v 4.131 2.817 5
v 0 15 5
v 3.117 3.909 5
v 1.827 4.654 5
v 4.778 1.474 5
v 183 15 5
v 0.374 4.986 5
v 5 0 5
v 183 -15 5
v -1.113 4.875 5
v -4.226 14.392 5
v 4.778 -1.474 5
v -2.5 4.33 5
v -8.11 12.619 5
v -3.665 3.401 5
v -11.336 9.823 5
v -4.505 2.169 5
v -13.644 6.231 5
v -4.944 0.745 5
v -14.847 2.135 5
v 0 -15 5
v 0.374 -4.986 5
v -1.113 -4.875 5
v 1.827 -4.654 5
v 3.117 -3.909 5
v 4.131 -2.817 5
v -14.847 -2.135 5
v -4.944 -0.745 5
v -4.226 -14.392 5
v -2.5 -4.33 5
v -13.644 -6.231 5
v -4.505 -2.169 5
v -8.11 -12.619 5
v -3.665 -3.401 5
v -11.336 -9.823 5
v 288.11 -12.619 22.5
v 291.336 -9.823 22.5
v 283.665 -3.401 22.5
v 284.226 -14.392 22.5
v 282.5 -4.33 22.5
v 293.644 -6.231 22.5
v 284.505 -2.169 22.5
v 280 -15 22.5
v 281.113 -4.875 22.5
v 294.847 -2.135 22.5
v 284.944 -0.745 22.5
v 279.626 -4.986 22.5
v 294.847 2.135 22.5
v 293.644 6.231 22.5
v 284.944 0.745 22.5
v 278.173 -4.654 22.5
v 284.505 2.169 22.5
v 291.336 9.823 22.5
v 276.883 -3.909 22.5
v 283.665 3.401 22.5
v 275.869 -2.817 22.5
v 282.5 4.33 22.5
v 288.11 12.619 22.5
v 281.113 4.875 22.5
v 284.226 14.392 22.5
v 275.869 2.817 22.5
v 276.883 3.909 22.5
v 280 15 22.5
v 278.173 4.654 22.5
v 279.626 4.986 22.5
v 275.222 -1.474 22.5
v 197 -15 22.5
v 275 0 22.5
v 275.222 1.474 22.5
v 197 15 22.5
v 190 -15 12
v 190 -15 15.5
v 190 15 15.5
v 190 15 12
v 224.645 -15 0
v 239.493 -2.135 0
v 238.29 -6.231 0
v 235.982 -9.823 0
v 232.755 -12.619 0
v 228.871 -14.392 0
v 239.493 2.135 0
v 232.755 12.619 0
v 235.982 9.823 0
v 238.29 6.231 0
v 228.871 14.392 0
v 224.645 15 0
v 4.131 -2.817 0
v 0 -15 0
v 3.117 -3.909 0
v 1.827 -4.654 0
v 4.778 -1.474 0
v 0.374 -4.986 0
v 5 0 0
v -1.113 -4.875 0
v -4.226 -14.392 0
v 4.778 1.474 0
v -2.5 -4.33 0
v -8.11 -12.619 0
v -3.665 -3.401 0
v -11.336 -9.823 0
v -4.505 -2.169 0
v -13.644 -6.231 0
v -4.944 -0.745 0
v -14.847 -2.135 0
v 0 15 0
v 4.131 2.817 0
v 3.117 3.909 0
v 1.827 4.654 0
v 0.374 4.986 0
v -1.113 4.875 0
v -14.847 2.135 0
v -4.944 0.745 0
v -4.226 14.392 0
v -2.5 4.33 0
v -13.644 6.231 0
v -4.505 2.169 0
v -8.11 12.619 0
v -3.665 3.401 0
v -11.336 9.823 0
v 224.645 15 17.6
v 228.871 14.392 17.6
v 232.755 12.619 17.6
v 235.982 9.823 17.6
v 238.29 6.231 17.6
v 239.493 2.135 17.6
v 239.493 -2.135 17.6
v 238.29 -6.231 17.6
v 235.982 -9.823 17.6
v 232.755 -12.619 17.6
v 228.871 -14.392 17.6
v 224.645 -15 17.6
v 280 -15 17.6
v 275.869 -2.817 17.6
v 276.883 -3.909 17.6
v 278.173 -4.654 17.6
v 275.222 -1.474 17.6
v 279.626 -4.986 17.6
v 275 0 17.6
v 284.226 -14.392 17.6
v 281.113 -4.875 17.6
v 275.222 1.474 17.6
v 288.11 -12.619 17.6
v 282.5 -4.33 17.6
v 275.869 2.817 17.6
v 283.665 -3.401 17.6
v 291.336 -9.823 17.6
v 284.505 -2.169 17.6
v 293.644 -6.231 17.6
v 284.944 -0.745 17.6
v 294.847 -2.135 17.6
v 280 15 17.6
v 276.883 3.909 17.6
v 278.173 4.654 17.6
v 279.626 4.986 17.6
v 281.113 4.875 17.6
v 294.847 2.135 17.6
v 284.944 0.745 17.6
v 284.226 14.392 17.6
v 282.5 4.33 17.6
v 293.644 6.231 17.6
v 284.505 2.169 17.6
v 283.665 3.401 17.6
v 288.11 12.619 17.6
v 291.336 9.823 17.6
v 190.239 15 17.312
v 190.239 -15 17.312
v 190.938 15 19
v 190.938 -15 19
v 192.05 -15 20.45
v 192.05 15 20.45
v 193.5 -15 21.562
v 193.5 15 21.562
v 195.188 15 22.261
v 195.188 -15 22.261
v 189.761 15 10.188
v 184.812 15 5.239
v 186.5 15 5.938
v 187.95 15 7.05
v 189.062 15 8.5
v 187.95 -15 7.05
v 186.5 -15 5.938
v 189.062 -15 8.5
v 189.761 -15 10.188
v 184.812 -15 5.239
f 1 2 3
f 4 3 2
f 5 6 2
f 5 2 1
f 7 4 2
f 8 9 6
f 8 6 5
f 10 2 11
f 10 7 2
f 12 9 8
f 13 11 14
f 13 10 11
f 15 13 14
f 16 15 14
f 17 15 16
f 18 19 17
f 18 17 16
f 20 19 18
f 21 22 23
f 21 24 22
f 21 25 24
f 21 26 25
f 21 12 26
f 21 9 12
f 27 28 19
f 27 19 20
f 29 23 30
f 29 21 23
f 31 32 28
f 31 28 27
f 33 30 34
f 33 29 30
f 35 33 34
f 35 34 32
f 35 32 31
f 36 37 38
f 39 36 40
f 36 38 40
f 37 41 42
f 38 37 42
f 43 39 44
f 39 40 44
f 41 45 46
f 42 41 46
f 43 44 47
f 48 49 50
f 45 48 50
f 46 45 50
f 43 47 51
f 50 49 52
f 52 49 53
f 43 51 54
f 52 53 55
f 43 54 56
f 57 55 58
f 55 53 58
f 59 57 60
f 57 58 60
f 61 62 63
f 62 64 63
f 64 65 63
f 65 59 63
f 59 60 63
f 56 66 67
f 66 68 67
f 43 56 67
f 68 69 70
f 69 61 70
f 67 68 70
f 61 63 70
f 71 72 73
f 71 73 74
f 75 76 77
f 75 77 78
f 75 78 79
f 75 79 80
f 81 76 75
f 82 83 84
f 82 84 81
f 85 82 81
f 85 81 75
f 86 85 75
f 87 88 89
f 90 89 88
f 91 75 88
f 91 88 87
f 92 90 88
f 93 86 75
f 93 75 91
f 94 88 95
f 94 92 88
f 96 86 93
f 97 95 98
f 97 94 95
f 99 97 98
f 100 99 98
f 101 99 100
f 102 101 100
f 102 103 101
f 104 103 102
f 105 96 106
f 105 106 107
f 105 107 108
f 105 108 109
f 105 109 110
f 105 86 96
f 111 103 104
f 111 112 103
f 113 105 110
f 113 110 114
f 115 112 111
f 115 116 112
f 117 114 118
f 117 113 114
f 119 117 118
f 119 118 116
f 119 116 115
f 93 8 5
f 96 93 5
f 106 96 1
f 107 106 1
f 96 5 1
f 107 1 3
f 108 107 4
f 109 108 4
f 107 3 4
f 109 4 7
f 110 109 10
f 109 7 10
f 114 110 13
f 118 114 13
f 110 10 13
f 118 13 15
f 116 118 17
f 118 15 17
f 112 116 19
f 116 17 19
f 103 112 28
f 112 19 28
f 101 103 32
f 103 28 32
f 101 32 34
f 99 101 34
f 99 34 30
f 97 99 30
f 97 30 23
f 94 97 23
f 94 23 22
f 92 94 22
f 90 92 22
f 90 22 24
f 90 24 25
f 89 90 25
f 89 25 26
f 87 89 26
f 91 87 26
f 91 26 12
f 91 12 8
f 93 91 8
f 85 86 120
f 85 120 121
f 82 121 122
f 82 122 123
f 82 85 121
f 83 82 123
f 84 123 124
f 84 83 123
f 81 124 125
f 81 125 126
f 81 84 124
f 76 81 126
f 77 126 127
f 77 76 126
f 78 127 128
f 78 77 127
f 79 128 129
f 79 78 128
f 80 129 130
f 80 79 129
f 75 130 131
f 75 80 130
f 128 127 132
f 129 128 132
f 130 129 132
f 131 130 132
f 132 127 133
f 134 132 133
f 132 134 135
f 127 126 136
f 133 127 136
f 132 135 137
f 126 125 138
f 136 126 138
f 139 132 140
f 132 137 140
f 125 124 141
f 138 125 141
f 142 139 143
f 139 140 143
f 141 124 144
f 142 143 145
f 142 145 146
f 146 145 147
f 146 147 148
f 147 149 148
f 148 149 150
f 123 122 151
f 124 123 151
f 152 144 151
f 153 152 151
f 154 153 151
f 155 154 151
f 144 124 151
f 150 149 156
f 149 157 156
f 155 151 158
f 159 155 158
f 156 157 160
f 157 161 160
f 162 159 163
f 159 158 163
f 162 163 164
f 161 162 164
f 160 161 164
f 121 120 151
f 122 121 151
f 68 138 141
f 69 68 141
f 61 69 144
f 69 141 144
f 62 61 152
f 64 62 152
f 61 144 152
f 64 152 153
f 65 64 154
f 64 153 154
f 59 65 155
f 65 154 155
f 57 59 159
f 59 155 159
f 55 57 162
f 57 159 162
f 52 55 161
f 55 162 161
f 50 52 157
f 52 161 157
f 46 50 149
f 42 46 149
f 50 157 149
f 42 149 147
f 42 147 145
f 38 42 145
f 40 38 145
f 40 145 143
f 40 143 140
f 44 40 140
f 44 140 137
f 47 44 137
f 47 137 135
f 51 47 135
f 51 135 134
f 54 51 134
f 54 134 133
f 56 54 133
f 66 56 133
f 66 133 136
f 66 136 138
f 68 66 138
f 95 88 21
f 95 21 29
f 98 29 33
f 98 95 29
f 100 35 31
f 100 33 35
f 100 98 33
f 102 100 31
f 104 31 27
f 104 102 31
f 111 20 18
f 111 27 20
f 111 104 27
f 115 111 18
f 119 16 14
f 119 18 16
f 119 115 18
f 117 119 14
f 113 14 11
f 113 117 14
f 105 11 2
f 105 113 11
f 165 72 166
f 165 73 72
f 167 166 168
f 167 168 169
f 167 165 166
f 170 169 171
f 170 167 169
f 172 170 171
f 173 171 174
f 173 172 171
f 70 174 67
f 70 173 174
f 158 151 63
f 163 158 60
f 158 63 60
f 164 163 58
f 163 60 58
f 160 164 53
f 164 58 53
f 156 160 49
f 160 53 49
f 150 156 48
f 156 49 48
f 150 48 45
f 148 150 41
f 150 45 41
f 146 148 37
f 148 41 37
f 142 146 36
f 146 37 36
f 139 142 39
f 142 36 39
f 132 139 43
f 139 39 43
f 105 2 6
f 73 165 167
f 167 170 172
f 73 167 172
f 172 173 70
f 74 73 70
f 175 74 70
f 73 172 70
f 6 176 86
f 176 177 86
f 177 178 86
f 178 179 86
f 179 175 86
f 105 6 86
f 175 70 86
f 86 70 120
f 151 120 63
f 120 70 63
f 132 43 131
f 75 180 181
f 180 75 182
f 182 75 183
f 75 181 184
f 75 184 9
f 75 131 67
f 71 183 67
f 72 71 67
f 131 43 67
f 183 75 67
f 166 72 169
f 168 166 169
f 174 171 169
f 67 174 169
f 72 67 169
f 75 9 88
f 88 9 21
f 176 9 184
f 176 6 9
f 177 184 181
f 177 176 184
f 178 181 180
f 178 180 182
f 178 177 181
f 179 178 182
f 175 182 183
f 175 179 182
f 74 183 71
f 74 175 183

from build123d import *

# Parameters (mm, degrees)
BOSS_EXTRUDE1_DEPTH = 45
SKETCH2_R           = 5
CUT_EXTRUDE1_DEPTH  = 90
SKETCH7_OUTSIDE_W   = 279.254
SKETCH7_OUTSIDE_H   = 94.254
CUT_EXTRUDE2_DEPTH  = 50
FILLET1_R           = 7
BOSS_EXTRUDE2_DEPTH = 22.5
CUT_EXTRUDE3_START  = -17.6
SKETCH10_R          = 15
CUT_EXTRUDE3_DEPTH  = 17.6
FILLET3_START       = -1
FILLET3_DEPTH       = 18.6
CUT_EXTRUDE4_DEPTH  = 17.6
SKETCH12_R          = 5
CUT_EXTRUDE5_DEPTH  = 15


with BuildPart() as part:
    # Sketch1 → Boss-Extrude1 (new body)
    with BuildSketch(Plane.XY):
        with BuildLine():
            Line((0, 15), (200, 15))
            ThreePointArc((200, 15), (215, 0), (200, -15))
            Line((200, -15), (0, -15))
            ThreePointArc((0, -15), (-15, 0), (0, 15))
        make_face()
    extrude(amount=BOSS_EXTRUDE1_DEPTH)

    # Sketch2 → Cut-Extrude1 (cut)
    with BuildSketch(Plane.XY.offset(45)):
        Circle(SKETCH2_R)
    extrude(amount=-CUT_EXTRUDE1_DEPTH, mode=Mode.SUBTRACT)

    # Sketch7 outside → Cut-Extrude2 (cut)
    with BuildSketch(Plane.XZ.offset(15)):
        with Locations((100, 22.5)):
            Rectangle(SKETCH7_OUTSIDE_W, SKETCH7_OUTSIDE_H)
        Polygon((215, 22.5), (190, 22.5), (190, 5), (-15, 5), (-15, 0), (215, 0), align=None, mode=Mode.SUBTRACT)
    extrude(amount=-CUT_EXTRUDE2_DEPTH, mode=Mode.SUBTRACT)

    # Fillet1
    fillet1_edges = [part.edges().sort_by_distance(p)[0] for p in [
        (190, 0, 22.5),
        (190, 0, 5),
    ]]
    fillet(fillet1_edges, radius=FILLET1_R)

    # Sketch8 → Boss-Extrude2 (add)
    with BuildSketch(Plane.XY.offset(22.5)):
        with BuildLine():
            Line((200, 15), (280, 15))
            ThreePointArc((280, 15), (295, 0), (280, -15))
            Line((280, -15), (200, -15))
            Line((200, -15), (200, 15))
        make_face()
    extrude(amount=-BOSS_EXTRUDE2_DEPTH)

    # Sketch10 → Cut-Extrude3 (cut)
    with BuildSketch(Plane(origin=(0, 0, 0), x_dir=(-1, 0, 0), z_dir=(0, 0, -1)).offset(CUT_EXTRUDE3_START)):
        with Locations((-280, 0)):
            Circle(SKETCH10_R)
    extrude(amount=CUT_EXTRUDE3_DEPTH, mode=Mode.SUBTRACT)

    # Fillet3: read off the stored shape, not the designer's step
    # Fillet3 outline → Fillet3 (cut)
    with BuildSketch(Plane.XY.offset(FILLET3_START)):
        with BuildLine():
            ThreePointArc((280, -15), (271.538858878, -12.385842358), (266.026885319, -5.454545455))
            ThreePointArc((266.026885319, -5.454545455), (265.286158235, -11.948532524), (259.506098468, -15))
            Line((259.506098468, -15), (280, -15))
        make_face()
        with BuildLine():
            ThreePointArc((259.506098468, 15), (265.286158235, 11.948532524), (266.026885319, 5.454545455))
            ThreePointArc((266.026885319, 5.454545455), (271.538858878, 12.385842358), (280, 15))
            Line((280, 15), (259.506098468, 15))
        make_face()
    extrude(amount=FILLET3_DEPTH, mode=Mode.SUBTRACT)

    # Sketch11 → Cut-Extrude4 (cut)
    with BuildSketch(Plane(origin=(0, 0, 0), x_dir=(-1, 0, 0), z_dir=(0, 0, -1))):
        with BuildLine():
            Line((-224.645366828, -15), (-269.753049234, -15))
            Line((-269.753049234, -15), (-269.753049234, 15))
            Line((-269.753049234, 15), (-224.645366828, 15))
            ThreePointArc((-224.645366828, 15), (-239.645366828, 0), (-224.645366828, -15))
        make_face()
    extrude(amount=-CUT_EXTRUDE4_DEPTH, mode=Mode.SUBTRACT)

    # Sketch12 → Cut-Extrude5 (cut)
    with BuildSketch(Plane(origin=(0, 0, 17.6), x_dir=(-1, 0, 0), z_dir=(0, 0, -1))):
        with Locations((-280, 0)):
            Circle(SKETCH12_R)
    extrude(amount=-CUT_EXTRUDE5_DEPTH, mode=Mode.SUBTRACT)


solid = part.part
